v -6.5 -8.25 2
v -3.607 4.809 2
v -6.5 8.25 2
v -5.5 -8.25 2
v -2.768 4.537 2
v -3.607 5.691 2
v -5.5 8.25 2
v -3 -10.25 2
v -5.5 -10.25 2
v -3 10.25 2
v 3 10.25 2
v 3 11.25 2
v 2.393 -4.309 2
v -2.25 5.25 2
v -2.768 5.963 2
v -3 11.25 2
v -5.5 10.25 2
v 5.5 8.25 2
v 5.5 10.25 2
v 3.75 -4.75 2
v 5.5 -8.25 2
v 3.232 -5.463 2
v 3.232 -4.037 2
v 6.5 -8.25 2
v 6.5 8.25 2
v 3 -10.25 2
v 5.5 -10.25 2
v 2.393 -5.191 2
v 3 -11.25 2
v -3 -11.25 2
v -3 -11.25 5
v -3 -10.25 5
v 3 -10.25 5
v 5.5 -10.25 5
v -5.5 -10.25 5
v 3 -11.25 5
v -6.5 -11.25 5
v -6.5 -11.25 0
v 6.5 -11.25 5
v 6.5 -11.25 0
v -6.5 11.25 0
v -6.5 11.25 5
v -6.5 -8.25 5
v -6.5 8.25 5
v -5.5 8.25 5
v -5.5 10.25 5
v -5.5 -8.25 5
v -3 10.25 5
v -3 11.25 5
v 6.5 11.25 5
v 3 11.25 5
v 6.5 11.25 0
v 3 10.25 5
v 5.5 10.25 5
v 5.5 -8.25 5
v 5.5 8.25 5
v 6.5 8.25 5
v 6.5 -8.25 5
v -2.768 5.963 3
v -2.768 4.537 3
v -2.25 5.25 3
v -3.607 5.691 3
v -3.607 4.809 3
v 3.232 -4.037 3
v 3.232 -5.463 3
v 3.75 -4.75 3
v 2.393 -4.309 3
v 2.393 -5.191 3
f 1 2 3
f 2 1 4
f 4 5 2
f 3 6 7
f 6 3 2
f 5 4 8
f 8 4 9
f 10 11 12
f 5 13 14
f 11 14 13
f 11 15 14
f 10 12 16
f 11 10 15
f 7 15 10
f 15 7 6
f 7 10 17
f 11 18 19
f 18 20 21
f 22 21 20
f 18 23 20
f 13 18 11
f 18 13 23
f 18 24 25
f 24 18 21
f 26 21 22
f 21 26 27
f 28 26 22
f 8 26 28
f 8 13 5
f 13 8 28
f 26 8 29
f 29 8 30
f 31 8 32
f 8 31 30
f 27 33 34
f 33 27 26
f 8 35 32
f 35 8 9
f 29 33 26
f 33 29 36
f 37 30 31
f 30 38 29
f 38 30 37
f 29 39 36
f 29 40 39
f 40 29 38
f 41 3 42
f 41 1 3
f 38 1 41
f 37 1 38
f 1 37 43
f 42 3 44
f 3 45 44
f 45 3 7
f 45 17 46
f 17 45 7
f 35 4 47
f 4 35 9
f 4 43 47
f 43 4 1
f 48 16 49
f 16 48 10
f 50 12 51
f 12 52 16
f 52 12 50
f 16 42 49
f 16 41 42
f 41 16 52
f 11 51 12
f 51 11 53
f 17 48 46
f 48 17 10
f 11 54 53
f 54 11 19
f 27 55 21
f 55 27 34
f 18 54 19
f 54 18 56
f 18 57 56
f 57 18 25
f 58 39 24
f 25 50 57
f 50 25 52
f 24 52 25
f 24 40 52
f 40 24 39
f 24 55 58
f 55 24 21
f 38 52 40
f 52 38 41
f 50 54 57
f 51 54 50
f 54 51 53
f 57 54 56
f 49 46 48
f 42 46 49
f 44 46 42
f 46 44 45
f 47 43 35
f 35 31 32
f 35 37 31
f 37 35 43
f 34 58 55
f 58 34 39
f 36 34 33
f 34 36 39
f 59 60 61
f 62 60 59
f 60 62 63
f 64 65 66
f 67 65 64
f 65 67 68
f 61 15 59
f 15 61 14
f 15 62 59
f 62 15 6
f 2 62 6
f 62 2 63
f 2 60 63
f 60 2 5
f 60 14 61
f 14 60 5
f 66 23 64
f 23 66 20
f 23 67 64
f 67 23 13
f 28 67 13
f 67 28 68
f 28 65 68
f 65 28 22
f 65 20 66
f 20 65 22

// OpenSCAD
module SolenoidMount() {
  x_padding = 0;
  y_padding = 0;
  bottom_padding = 2;

  solenoid_z = 12;
  solenoid_x = 11 + (2 * x_padding);
  solenoid_y = 20.5 + (2 * y_padding);

  wall_thickness = 1;

  case_z = solenoid_z;
  case_x = solenoid_x + (wall_thickness * 2);
  case_y = solenoid_y + (wall_thickness * 2);

  shaft_width_front = 3;
  shaft_width_back = 6;
  corner_height = 3;

  union() {
    difference() {
      linear_extrude(corner_height + bottom_padding)
        square(size = [case_x, case_y], center = true);

      // Solenoid cutout
      translate([0, 0, bottom_padding])
        linear_extrude(solenoid_z)
        square(size = [solenoid_x, solenoid_y], center = true);

      for(i = [-1, 1]) {
        translate([0, i *((solenoid_y / 2) + (wall_thickness / 2)), bottom_padding])
          linear_extrude(solenoid_z)
          square(size = [shaft_width_back, wall_thickness], center = true);

        translate([i *((solenoid_x / 2) + (wall_thickness / 2)), 0, bottom_padding])
          linear_extrude(solenoid_z)
          square(size = [wall_thickness, solenoid_y - 4], center = true);
      }
    }

    translate([0, 0, bottom_padding])
      linear_extrude(1) {
        front = solenoid_y / 2;
        translate([-3, front - 5, 0])
          circle(d = 1.5);

        translate([3, front - 5 - 10, 0])
          circle(d = 1.5);
      }
  }
}

SolenoidMount();
